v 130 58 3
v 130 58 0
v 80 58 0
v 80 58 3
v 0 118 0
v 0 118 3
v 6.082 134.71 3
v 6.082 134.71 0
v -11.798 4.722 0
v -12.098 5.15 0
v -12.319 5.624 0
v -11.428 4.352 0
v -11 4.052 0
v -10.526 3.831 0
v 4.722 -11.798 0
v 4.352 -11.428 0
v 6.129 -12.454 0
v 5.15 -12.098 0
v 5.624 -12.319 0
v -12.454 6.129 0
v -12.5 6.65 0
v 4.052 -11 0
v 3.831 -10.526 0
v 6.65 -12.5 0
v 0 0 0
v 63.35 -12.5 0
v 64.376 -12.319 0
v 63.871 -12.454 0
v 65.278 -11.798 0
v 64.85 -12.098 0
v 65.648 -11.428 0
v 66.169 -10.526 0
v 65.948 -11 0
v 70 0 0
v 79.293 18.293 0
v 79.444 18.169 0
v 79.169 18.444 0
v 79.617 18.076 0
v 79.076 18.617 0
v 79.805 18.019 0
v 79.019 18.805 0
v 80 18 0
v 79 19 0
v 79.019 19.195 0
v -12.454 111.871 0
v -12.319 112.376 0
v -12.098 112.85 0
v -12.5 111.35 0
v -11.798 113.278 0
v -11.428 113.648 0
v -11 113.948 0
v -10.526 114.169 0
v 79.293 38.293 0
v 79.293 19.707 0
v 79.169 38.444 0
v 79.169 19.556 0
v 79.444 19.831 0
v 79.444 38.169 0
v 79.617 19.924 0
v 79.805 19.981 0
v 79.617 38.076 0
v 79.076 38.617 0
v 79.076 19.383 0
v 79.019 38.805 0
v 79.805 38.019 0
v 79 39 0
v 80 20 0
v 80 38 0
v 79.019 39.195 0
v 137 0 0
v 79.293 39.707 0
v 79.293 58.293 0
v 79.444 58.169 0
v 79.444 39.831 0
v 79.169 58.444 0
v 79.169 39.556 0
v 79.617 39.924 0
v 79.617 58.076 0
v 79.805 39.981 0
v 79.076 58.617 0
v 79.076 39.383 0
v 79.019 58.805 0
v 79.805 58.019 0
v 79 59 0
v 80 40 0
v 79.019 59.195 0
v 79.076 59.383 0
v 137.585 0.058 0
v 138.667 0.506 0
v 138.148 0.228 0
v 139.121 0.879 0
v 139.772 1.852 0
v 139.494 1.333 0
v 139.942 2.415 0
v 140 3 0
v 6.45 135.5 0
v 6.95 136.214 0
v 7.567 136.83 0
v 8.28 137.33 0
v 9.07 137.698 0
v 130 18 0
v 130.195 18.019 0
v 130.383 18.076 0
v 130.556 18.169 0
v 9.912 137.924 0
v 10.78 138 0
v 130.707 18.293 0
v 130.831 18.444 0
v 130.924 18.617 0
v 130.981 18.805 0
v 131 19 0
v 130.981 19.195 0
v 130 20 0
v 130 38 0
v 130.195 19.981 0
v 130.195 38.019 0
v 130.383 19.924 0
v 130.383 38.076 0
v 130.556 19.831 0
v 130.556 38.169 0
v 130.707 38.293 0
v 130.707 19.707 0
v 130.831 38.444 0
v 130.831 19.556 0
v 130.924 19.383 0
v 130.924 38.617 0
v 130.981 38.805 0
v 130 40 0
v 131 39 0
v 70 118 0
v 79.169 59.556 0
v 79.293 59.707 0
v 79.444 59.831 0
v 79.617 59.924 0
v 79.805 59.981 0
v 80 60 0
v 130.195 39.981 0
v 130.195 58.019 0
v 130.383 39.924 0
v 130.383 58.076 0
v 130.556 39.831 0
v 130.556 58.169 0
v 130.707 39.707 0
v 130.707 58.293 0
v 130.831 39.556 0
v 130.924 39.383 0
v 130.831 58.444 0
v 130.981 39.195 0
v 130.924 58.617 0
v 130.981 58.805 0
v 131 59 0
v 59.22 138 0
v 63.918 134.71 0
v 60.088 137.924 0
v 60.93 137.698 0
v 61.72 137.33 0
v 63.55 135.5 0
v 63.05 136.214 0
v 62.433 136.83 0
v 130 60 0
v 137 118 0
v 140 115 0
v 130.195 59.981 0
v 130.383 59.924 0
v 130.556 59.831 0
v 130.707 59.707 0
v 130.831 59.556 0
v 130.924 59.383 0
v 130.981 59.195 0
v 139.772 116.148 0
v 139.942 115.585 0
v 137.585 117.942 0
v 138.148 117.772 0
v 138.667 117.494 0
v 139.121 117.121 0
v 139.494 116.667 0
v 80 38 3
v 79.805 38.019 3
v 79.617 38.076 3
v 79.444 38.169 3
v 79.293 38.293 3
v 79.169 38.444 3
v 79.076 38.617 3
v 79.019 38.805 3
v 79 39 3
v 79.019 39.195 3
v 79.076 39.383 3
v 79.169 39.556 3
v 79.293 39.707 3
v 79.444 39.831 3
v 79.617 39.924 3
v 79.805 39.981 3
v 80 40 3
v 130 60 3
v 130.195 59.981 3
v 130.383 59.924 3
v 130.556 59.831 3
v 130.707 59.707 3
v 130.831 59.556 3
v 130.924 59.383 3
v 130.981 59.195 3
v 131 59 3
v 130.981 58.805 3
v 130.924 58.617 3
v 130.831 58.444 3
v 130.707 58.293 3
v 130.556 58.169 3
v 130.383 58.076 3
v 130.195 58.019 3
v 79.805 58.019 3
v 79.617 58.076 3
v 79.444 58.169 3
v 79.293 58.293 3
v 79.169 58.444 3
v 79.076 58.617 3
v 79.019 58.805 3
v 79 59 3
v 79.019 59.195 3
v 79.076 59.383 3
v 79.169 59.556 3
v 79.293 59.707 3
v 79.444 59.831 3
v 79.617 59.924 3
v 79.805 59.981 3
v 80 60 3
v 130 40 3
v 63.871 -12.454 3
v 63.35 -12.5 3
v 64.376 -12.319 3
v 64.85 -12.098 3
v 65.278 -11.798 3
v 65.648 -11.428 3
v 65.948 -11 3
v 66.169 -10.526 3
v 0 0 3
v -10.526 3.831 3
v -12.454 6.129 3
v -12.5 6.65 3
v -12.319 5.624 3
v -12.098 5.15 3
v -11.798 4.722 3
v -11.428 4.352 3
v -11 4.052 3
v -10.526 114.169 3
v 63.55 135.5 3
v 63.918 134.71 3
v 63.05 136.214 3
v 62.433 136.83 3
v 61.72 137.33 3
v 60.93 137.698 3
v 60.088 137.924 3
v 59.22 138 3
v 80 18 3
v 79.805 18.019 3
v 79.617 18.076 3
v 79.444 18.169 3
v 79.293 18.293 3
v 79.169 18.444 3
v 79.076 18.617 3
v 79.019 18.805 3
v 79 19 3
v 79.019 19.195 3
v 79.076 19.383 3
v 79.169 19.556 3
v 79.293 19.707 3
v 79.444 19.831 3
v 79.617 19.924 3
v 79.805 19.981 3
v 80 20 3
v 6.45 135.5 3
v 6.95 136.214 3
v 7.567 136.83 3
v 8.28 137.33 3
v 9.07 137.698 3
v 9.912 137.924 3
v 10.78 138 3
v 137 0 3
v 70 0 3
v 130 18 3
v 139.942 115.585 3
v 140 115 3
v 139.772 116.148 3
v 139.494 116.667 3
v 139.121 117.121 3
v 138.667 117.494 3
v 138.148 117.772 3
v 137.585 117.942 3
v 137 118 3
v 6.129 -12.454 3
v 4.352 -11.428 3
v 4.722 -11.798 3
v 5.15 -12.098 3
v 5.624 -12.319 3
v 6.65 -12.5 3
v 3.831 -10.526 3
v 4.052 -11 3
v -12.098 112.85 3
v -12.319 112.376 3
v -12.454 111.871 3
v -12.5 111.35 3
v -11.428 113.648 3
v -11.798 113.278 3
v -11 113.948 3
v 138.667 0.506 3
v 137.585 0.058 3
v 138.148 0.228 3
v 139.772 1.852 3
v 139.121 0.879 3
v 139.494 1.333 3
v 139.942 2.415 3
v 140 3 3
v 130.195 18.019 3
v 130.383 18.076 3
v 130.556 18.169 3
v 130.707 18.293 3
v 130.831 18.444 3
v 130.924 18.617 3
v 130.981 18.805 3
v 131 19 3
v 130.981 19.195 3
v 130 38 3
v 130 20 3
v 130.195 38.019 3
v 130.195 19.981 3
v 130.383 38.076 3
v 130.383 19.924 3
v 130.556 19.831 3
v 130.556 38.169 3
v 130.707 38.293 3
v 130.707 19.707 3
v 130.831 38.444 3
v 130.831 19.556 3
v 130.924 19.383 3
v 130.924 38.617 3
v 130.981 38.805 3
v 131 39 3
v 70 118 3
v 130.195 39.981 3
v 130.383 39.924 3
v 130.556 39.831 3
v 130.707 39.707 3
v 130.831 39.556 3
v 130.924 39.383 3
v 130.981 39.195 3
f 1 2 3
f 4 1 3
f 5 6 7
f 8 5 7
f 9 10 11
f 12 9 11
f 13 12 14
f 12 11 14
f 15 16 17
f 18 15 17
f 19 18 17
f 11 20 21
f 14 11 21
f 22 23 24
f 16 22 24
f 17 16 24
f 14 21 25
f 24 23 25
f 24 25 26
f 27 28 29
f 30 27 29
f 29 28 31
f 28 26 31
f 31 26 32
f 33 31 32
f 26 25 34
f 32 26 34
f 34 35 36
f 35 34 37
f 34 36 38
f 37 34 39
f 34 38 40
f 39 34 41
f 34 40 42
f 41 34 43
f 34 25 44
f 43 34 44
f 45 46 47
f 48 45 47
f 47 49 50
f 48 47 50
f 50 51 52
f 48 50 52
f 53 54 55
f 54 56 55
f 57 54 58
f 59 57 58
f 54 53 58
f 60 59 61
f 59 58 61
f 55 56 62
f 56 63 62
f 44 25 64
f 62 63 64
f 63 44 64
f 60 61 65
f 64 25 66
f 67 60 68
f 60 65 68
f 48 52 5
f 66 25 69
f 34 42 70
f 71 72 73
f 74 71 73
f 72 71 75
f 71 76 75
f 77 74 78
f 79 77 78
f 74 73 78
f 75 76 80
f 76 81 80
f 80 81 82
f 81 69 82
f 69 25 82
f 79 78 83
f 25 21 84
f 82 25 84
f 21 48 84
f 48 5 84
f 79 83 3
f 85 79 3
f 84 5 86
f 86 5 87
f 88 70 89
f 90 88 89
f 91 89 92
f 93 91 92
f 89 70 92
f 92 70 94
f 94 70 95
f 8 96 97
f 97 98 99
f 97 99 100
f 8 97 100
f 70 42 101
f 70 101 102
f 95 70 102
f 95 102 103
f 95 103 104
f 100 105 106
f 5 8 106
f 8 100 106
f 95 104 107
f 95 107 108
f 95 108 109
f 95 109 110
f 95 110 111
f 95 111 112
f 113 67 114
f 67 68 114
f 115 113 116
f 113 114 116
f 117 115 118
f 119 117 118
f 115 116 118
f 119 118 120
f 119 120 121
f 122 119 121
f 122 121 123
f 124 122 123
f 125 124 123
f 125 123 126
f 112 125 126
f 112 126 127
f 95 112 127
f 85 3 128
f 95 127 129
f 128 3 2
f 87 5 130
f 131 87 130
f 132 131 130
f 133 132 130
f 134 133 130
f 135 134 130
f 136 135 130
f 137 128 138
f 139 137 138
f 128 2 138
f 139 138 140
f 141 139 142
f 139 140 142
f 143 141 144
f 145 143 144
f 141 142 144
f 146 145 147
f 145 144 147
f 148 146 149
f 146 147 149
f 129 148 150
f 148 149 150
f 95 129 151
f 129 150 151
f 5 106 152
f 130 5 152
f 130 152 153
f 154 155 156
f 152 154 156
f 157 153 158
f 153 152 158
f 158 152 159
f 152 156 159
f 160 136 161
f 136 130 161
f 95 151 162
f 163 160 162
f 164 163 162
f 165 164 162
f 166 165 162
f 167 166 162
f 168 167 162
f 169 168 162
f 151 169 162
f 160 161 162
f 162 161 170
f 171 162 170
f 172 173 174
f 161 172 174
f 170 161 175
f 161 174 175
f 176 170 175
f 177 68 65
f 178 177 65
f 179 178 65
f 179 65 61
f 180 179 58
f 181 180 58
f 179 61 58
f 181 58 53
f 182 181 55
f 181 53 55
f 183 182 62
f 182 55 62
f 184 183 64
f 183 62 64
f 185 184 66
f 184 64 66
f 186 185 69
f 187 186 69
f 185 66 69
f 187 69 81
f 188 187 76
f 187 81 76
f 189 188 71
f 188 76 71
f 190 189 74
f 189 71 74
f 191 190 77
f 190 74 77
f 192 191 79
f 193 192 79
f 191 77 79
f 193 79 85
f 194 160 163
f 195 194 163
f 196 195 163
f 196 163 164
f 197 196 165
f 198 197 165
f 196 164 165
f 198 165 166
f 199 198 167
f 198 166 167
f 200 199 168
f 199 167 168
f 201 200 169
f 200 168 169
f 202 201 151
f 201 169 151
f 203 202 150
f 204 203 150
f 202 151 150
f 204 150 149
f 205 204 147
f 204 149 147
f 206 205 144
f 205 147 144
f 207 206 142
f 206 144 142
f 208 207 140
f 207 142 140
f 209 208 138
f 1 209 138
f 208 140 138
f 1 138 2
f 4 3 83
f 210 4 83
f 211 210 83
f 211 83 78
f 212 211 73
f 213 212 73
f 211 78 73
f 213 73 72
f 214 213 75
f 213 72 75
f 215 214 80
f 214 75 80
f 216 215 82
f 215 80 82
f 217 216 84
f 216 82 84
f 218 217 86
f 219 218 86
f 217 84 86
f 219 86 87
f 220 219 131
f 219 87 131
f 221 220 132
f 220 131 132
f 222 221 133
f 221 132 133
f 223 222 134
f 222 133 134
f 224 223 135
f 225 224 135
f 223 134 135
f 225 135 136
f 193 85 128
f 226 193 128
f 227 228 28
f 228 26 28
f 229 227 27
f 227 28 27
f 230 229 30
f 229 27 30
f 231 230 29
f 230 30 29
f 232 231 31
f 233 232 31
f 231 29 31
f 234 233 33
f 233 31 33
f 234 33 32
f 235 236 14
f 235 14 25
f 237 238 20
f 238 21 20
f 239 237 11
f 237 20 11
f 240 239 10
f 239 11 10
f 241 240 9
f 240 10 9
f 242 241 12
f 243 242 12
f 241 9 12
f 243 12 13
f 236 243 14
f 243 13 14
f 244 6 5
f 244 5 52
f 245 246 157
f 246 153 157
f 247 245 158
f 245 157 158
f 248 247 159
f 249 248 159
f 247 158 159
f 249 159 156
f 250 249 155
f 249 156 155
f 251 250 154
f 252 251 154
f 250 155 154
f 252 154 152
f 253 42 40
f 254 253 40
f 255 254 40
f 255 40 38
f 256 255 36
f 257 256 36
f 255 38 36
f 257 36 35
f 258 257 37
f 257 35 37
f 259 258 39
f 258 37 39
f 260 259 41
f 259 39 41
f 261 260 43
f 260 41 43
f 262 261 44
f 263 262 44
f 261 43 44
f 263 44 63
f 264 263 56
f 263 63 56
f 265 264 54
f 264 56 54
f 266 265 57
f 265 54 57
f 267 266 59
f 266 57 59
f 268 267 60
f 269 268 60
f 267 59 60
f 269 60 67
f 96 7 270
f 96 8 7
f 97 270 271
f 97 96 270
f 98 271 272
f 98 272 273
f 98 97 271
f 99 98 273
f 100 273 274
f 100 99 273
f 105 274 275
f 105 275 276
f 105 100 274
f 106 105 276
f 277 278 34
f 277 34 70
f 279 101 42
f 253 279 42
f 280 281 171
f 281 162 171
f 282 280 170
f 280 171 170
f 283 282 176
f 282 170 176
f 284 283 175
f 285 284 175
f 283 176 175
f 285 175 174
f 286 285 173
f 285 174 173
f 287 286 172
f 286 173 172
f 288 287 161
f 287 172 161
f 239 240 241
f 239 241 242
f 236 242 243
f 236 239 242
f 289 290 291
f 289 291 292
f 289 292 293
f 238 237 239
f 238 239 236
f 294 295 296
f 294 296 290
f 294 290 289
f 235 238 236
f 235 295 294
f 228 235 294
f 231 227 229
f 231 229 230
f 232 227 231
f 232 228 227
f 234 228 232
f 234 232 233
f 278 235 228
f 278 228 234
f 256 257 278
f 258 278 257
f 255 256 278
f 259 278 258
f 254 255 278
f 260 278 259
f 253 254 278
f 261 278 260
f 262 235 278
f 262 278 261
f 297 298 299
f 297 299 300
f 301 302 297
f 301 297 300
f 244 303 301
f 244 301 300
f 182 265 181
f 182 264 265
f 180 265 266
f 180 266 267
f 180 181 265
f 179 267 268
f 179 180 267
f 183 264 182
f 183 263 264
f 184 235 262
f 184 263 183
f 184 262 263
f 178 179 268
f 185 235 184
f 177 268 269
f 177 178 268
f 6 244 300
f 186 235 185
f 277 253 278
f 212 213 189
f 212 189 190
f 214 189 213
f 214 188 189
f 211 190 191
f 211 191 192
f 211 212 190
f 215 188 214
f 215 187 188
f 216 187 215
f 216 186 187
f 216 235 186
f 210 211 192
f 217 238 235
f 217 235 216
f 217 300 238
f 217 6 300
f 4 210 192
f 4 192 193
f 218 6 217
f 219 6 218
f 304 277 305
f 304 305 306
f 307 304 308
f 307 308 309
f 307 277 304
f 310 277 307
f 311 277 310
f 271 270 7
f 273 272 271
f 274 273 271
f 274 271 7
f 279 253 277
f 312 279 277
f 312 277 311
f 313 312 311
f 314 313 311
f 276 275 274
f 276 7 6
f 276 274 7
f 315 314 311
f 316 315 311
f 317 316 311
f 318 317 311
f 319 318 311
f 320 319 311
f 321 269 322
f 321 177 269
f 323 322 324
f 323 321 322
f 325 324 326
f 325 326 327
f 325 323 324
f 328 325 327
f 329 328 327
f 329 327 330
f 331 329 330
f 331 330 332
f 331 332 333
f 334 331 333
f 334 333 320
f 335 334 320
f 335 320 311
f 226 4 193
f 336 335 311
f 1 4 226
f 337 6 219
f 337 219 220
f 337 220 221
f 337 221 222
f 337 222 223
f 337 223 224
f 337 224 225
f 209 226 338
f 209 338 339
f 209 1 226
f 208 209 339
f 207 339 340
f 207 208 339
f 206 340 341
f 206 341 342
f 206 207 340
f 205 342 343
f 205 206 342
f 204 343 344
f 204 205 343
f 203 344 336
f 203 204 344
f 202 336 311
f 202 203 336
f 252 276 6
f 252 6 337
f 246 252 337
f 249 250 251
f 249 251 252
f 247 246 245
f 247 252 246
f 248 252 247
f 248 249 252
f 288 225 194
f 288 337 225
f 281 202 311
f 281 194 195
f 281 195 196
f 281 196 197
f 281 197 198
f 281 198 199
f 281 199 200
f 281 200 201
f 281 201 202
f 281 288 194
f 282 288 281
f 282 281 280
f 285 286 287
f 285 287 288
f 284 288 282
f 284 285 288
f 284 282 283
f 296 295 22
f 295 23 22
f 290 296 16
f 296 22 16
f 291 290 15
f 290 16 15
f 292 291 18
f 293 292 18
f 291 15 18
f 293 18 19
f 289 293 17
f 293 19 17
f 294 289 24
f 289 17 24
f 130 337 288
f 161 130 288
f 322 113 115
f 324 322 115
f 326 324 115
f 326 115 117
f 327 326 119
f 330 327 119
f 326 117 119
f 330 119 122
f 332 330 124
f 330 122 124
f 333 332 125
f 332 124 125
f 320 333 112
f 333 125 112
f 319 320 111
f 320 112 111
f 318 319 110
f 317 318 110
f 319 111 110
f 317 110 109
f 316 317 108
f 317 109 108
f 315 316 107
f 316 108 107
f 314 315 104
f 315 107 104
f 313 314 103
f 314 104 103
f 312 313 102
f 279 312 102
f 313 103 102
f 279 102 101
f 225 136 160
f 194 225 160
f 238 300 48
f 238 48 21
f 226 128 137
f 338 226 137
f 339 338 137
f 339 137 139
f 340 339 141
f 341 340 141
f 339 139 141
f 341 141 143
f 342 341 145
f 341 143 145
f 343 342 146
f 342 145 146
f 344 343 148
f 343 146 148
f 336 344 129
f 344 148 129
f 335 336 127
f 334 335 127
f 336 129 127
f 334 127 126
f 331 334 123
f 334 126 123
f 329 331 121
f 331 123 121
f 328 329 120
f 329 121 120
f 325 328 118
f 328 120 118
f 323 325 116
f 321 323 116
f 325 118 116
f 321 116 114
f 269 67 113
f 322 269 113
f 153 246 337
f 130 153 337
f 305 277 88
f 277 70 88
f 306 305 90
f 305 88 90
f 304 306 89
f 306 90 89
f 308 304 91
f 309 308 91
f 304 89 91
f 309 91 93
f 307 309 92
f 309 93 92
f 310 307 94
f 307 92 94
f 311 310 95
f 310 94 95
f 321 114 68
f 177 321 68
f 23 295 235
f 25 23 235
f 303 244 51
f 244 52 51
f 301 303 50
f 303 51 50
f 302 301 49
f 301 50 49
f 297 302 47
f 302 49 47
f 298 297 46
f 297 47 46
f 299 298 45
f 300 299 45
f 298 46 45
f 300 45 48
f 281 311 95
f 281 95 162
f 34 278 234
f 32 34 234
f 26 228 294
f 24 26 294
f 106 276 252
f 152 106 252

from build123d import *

# Parameters (mm, degrees)
ESQUISSE1_W                  = 70
ESQUISSE1_H                  = 118
BOSS_EXTRU_1_DEPTH           = 3
BOSS_EXTRU_2_DEPTH           = 3
CONG_1_R                     = 3
CONG_2_R                     = 3
CONG_3_R                     = 5
ESQUISSE3_W                  = 70
ESQUISSE3_H                  = 118
BOSS_EXTRU_3_DEPTH           = 3
CONG_4_R                     = 3
ENL_V_MAT_EXTRU_1_DEPTH      = 197.603662224
ENL_V_MAT_EXTRU_1_DEPTH_BACK = 197.603662224


with BuildPart() as part:
    # Esquisse1 → Boss.-Extru.1 (new body)
    with BuildSketch(Plane.XY):
        with Locations((35, 59)):
            Rectangle(ESQUISSE1_W, ESQUISSE1_H)
    extrude(amount=BOSS_EXTRU_1_DEPTH)

    # Esquisse2 → Boss.-Extru.2 (add)
    with BuildSketch(Plane.XY.offset(3)):
        Polygon((0, 118), (7.279404685, 138), (62.720595315, 138), (70, 118), align=None)
        Polygon((0, 118), (-12.5, 113.450372072), (-12.5, 4.549627928), (0, 0), align=None)
        Polygon((65.450372072, -12.5), (4.549627928, -12.5), (0, 0), (70, 0), align=None)
    extrude(amount=-BOSS_EXTRU_2_DEPTH)

    # Congé1
    cong_1_edges = [part.edges().sort_by_distance(p)[0] for p in [
        (-12.5, 4.549627928, 1.5),
        (-12.5, 113.450372072, 1.5),
    ]]
    fillet(cong_1_edges, radius=CONG_1_R)

    # Congé2
    cong_2_edges = [part.edges().sort_by_distance(p)[0] for p in [
        (65.450372072, -12.5, 1.5),
        (4.549627928, -12.5, 1.5),
    ]]
    fillet(cong_2_edges, radius=CONG_2_R)

    # Congé3
    cong_3_edges = [part.edges().sort_by_distance(p)[0] for p in [
        (7.279404685, 138, 1.5),
        (62.720595315, 138, 1.5),
    ]]
    fillet(cong_3_edges, radius=CONG_3_R)

    # Esquisse3 → Boss.-Extru.3 (add)
    with BuildSketch(Plane.XY.offset(3)):
        with Locations((105, 59)):
            Rectangle(ESQUISSE3_W, ESQUISSE3_H)
    extrude(amount=-BOSS_EXTRU_3_DEPTH)

    # Congé4
    cong_4_edges = [part.edges().sort_by_distance(p)[0] for p in [
        (140, 118, 1.5),
        (140, 0, 1.5),
    ]]
    fillet(cong_4_edges, radius=CONG_4_R)

    # Esquisse4 → Enlèv. mat.-Extru.1 (cut, two sides: drawn at the far end of the back side and taken through both)
    with BuildSketch(Plane.XY.offset(3).offset(-ENL_V_MAT_EXTRU_1_DEPTH_BACK)):
        with BuildLine():
            Line((80, 60), (130, 60))
            ThreePointArc((130, 60), (131, 59), (130, 58))
            Line((130, 58), (80, 58))
            ThreePointArc((80, 58), (79, 59), (80, 60))
        make_face()
        with BuildLine():
            Line((80, 40), (130, 40))
            ThreePointArc((130, 40), (131, 39), (130, 38))
            Line((130, 38), (80, 38))
            ThreePointArc((80, 38), (79, 39), (80, 40))
        make_face()
        with BuildLine():
            Line((80, 20), (130, 20))
            ThreePointArc((130, 20), (131, 19), (130, 18))
            Line((130, 18), (80, 18))
            ThreePointArc((80, 18), (79, 19), (80, 20))
        make_face()
    extrude(amount=ENL_V_MAT_EXTRU_1_DEPTH + ENL_V_MAT_EXTRU_1_DEPTH_BACK, mode=Mode.SUBTRACT)


solid = part.part
